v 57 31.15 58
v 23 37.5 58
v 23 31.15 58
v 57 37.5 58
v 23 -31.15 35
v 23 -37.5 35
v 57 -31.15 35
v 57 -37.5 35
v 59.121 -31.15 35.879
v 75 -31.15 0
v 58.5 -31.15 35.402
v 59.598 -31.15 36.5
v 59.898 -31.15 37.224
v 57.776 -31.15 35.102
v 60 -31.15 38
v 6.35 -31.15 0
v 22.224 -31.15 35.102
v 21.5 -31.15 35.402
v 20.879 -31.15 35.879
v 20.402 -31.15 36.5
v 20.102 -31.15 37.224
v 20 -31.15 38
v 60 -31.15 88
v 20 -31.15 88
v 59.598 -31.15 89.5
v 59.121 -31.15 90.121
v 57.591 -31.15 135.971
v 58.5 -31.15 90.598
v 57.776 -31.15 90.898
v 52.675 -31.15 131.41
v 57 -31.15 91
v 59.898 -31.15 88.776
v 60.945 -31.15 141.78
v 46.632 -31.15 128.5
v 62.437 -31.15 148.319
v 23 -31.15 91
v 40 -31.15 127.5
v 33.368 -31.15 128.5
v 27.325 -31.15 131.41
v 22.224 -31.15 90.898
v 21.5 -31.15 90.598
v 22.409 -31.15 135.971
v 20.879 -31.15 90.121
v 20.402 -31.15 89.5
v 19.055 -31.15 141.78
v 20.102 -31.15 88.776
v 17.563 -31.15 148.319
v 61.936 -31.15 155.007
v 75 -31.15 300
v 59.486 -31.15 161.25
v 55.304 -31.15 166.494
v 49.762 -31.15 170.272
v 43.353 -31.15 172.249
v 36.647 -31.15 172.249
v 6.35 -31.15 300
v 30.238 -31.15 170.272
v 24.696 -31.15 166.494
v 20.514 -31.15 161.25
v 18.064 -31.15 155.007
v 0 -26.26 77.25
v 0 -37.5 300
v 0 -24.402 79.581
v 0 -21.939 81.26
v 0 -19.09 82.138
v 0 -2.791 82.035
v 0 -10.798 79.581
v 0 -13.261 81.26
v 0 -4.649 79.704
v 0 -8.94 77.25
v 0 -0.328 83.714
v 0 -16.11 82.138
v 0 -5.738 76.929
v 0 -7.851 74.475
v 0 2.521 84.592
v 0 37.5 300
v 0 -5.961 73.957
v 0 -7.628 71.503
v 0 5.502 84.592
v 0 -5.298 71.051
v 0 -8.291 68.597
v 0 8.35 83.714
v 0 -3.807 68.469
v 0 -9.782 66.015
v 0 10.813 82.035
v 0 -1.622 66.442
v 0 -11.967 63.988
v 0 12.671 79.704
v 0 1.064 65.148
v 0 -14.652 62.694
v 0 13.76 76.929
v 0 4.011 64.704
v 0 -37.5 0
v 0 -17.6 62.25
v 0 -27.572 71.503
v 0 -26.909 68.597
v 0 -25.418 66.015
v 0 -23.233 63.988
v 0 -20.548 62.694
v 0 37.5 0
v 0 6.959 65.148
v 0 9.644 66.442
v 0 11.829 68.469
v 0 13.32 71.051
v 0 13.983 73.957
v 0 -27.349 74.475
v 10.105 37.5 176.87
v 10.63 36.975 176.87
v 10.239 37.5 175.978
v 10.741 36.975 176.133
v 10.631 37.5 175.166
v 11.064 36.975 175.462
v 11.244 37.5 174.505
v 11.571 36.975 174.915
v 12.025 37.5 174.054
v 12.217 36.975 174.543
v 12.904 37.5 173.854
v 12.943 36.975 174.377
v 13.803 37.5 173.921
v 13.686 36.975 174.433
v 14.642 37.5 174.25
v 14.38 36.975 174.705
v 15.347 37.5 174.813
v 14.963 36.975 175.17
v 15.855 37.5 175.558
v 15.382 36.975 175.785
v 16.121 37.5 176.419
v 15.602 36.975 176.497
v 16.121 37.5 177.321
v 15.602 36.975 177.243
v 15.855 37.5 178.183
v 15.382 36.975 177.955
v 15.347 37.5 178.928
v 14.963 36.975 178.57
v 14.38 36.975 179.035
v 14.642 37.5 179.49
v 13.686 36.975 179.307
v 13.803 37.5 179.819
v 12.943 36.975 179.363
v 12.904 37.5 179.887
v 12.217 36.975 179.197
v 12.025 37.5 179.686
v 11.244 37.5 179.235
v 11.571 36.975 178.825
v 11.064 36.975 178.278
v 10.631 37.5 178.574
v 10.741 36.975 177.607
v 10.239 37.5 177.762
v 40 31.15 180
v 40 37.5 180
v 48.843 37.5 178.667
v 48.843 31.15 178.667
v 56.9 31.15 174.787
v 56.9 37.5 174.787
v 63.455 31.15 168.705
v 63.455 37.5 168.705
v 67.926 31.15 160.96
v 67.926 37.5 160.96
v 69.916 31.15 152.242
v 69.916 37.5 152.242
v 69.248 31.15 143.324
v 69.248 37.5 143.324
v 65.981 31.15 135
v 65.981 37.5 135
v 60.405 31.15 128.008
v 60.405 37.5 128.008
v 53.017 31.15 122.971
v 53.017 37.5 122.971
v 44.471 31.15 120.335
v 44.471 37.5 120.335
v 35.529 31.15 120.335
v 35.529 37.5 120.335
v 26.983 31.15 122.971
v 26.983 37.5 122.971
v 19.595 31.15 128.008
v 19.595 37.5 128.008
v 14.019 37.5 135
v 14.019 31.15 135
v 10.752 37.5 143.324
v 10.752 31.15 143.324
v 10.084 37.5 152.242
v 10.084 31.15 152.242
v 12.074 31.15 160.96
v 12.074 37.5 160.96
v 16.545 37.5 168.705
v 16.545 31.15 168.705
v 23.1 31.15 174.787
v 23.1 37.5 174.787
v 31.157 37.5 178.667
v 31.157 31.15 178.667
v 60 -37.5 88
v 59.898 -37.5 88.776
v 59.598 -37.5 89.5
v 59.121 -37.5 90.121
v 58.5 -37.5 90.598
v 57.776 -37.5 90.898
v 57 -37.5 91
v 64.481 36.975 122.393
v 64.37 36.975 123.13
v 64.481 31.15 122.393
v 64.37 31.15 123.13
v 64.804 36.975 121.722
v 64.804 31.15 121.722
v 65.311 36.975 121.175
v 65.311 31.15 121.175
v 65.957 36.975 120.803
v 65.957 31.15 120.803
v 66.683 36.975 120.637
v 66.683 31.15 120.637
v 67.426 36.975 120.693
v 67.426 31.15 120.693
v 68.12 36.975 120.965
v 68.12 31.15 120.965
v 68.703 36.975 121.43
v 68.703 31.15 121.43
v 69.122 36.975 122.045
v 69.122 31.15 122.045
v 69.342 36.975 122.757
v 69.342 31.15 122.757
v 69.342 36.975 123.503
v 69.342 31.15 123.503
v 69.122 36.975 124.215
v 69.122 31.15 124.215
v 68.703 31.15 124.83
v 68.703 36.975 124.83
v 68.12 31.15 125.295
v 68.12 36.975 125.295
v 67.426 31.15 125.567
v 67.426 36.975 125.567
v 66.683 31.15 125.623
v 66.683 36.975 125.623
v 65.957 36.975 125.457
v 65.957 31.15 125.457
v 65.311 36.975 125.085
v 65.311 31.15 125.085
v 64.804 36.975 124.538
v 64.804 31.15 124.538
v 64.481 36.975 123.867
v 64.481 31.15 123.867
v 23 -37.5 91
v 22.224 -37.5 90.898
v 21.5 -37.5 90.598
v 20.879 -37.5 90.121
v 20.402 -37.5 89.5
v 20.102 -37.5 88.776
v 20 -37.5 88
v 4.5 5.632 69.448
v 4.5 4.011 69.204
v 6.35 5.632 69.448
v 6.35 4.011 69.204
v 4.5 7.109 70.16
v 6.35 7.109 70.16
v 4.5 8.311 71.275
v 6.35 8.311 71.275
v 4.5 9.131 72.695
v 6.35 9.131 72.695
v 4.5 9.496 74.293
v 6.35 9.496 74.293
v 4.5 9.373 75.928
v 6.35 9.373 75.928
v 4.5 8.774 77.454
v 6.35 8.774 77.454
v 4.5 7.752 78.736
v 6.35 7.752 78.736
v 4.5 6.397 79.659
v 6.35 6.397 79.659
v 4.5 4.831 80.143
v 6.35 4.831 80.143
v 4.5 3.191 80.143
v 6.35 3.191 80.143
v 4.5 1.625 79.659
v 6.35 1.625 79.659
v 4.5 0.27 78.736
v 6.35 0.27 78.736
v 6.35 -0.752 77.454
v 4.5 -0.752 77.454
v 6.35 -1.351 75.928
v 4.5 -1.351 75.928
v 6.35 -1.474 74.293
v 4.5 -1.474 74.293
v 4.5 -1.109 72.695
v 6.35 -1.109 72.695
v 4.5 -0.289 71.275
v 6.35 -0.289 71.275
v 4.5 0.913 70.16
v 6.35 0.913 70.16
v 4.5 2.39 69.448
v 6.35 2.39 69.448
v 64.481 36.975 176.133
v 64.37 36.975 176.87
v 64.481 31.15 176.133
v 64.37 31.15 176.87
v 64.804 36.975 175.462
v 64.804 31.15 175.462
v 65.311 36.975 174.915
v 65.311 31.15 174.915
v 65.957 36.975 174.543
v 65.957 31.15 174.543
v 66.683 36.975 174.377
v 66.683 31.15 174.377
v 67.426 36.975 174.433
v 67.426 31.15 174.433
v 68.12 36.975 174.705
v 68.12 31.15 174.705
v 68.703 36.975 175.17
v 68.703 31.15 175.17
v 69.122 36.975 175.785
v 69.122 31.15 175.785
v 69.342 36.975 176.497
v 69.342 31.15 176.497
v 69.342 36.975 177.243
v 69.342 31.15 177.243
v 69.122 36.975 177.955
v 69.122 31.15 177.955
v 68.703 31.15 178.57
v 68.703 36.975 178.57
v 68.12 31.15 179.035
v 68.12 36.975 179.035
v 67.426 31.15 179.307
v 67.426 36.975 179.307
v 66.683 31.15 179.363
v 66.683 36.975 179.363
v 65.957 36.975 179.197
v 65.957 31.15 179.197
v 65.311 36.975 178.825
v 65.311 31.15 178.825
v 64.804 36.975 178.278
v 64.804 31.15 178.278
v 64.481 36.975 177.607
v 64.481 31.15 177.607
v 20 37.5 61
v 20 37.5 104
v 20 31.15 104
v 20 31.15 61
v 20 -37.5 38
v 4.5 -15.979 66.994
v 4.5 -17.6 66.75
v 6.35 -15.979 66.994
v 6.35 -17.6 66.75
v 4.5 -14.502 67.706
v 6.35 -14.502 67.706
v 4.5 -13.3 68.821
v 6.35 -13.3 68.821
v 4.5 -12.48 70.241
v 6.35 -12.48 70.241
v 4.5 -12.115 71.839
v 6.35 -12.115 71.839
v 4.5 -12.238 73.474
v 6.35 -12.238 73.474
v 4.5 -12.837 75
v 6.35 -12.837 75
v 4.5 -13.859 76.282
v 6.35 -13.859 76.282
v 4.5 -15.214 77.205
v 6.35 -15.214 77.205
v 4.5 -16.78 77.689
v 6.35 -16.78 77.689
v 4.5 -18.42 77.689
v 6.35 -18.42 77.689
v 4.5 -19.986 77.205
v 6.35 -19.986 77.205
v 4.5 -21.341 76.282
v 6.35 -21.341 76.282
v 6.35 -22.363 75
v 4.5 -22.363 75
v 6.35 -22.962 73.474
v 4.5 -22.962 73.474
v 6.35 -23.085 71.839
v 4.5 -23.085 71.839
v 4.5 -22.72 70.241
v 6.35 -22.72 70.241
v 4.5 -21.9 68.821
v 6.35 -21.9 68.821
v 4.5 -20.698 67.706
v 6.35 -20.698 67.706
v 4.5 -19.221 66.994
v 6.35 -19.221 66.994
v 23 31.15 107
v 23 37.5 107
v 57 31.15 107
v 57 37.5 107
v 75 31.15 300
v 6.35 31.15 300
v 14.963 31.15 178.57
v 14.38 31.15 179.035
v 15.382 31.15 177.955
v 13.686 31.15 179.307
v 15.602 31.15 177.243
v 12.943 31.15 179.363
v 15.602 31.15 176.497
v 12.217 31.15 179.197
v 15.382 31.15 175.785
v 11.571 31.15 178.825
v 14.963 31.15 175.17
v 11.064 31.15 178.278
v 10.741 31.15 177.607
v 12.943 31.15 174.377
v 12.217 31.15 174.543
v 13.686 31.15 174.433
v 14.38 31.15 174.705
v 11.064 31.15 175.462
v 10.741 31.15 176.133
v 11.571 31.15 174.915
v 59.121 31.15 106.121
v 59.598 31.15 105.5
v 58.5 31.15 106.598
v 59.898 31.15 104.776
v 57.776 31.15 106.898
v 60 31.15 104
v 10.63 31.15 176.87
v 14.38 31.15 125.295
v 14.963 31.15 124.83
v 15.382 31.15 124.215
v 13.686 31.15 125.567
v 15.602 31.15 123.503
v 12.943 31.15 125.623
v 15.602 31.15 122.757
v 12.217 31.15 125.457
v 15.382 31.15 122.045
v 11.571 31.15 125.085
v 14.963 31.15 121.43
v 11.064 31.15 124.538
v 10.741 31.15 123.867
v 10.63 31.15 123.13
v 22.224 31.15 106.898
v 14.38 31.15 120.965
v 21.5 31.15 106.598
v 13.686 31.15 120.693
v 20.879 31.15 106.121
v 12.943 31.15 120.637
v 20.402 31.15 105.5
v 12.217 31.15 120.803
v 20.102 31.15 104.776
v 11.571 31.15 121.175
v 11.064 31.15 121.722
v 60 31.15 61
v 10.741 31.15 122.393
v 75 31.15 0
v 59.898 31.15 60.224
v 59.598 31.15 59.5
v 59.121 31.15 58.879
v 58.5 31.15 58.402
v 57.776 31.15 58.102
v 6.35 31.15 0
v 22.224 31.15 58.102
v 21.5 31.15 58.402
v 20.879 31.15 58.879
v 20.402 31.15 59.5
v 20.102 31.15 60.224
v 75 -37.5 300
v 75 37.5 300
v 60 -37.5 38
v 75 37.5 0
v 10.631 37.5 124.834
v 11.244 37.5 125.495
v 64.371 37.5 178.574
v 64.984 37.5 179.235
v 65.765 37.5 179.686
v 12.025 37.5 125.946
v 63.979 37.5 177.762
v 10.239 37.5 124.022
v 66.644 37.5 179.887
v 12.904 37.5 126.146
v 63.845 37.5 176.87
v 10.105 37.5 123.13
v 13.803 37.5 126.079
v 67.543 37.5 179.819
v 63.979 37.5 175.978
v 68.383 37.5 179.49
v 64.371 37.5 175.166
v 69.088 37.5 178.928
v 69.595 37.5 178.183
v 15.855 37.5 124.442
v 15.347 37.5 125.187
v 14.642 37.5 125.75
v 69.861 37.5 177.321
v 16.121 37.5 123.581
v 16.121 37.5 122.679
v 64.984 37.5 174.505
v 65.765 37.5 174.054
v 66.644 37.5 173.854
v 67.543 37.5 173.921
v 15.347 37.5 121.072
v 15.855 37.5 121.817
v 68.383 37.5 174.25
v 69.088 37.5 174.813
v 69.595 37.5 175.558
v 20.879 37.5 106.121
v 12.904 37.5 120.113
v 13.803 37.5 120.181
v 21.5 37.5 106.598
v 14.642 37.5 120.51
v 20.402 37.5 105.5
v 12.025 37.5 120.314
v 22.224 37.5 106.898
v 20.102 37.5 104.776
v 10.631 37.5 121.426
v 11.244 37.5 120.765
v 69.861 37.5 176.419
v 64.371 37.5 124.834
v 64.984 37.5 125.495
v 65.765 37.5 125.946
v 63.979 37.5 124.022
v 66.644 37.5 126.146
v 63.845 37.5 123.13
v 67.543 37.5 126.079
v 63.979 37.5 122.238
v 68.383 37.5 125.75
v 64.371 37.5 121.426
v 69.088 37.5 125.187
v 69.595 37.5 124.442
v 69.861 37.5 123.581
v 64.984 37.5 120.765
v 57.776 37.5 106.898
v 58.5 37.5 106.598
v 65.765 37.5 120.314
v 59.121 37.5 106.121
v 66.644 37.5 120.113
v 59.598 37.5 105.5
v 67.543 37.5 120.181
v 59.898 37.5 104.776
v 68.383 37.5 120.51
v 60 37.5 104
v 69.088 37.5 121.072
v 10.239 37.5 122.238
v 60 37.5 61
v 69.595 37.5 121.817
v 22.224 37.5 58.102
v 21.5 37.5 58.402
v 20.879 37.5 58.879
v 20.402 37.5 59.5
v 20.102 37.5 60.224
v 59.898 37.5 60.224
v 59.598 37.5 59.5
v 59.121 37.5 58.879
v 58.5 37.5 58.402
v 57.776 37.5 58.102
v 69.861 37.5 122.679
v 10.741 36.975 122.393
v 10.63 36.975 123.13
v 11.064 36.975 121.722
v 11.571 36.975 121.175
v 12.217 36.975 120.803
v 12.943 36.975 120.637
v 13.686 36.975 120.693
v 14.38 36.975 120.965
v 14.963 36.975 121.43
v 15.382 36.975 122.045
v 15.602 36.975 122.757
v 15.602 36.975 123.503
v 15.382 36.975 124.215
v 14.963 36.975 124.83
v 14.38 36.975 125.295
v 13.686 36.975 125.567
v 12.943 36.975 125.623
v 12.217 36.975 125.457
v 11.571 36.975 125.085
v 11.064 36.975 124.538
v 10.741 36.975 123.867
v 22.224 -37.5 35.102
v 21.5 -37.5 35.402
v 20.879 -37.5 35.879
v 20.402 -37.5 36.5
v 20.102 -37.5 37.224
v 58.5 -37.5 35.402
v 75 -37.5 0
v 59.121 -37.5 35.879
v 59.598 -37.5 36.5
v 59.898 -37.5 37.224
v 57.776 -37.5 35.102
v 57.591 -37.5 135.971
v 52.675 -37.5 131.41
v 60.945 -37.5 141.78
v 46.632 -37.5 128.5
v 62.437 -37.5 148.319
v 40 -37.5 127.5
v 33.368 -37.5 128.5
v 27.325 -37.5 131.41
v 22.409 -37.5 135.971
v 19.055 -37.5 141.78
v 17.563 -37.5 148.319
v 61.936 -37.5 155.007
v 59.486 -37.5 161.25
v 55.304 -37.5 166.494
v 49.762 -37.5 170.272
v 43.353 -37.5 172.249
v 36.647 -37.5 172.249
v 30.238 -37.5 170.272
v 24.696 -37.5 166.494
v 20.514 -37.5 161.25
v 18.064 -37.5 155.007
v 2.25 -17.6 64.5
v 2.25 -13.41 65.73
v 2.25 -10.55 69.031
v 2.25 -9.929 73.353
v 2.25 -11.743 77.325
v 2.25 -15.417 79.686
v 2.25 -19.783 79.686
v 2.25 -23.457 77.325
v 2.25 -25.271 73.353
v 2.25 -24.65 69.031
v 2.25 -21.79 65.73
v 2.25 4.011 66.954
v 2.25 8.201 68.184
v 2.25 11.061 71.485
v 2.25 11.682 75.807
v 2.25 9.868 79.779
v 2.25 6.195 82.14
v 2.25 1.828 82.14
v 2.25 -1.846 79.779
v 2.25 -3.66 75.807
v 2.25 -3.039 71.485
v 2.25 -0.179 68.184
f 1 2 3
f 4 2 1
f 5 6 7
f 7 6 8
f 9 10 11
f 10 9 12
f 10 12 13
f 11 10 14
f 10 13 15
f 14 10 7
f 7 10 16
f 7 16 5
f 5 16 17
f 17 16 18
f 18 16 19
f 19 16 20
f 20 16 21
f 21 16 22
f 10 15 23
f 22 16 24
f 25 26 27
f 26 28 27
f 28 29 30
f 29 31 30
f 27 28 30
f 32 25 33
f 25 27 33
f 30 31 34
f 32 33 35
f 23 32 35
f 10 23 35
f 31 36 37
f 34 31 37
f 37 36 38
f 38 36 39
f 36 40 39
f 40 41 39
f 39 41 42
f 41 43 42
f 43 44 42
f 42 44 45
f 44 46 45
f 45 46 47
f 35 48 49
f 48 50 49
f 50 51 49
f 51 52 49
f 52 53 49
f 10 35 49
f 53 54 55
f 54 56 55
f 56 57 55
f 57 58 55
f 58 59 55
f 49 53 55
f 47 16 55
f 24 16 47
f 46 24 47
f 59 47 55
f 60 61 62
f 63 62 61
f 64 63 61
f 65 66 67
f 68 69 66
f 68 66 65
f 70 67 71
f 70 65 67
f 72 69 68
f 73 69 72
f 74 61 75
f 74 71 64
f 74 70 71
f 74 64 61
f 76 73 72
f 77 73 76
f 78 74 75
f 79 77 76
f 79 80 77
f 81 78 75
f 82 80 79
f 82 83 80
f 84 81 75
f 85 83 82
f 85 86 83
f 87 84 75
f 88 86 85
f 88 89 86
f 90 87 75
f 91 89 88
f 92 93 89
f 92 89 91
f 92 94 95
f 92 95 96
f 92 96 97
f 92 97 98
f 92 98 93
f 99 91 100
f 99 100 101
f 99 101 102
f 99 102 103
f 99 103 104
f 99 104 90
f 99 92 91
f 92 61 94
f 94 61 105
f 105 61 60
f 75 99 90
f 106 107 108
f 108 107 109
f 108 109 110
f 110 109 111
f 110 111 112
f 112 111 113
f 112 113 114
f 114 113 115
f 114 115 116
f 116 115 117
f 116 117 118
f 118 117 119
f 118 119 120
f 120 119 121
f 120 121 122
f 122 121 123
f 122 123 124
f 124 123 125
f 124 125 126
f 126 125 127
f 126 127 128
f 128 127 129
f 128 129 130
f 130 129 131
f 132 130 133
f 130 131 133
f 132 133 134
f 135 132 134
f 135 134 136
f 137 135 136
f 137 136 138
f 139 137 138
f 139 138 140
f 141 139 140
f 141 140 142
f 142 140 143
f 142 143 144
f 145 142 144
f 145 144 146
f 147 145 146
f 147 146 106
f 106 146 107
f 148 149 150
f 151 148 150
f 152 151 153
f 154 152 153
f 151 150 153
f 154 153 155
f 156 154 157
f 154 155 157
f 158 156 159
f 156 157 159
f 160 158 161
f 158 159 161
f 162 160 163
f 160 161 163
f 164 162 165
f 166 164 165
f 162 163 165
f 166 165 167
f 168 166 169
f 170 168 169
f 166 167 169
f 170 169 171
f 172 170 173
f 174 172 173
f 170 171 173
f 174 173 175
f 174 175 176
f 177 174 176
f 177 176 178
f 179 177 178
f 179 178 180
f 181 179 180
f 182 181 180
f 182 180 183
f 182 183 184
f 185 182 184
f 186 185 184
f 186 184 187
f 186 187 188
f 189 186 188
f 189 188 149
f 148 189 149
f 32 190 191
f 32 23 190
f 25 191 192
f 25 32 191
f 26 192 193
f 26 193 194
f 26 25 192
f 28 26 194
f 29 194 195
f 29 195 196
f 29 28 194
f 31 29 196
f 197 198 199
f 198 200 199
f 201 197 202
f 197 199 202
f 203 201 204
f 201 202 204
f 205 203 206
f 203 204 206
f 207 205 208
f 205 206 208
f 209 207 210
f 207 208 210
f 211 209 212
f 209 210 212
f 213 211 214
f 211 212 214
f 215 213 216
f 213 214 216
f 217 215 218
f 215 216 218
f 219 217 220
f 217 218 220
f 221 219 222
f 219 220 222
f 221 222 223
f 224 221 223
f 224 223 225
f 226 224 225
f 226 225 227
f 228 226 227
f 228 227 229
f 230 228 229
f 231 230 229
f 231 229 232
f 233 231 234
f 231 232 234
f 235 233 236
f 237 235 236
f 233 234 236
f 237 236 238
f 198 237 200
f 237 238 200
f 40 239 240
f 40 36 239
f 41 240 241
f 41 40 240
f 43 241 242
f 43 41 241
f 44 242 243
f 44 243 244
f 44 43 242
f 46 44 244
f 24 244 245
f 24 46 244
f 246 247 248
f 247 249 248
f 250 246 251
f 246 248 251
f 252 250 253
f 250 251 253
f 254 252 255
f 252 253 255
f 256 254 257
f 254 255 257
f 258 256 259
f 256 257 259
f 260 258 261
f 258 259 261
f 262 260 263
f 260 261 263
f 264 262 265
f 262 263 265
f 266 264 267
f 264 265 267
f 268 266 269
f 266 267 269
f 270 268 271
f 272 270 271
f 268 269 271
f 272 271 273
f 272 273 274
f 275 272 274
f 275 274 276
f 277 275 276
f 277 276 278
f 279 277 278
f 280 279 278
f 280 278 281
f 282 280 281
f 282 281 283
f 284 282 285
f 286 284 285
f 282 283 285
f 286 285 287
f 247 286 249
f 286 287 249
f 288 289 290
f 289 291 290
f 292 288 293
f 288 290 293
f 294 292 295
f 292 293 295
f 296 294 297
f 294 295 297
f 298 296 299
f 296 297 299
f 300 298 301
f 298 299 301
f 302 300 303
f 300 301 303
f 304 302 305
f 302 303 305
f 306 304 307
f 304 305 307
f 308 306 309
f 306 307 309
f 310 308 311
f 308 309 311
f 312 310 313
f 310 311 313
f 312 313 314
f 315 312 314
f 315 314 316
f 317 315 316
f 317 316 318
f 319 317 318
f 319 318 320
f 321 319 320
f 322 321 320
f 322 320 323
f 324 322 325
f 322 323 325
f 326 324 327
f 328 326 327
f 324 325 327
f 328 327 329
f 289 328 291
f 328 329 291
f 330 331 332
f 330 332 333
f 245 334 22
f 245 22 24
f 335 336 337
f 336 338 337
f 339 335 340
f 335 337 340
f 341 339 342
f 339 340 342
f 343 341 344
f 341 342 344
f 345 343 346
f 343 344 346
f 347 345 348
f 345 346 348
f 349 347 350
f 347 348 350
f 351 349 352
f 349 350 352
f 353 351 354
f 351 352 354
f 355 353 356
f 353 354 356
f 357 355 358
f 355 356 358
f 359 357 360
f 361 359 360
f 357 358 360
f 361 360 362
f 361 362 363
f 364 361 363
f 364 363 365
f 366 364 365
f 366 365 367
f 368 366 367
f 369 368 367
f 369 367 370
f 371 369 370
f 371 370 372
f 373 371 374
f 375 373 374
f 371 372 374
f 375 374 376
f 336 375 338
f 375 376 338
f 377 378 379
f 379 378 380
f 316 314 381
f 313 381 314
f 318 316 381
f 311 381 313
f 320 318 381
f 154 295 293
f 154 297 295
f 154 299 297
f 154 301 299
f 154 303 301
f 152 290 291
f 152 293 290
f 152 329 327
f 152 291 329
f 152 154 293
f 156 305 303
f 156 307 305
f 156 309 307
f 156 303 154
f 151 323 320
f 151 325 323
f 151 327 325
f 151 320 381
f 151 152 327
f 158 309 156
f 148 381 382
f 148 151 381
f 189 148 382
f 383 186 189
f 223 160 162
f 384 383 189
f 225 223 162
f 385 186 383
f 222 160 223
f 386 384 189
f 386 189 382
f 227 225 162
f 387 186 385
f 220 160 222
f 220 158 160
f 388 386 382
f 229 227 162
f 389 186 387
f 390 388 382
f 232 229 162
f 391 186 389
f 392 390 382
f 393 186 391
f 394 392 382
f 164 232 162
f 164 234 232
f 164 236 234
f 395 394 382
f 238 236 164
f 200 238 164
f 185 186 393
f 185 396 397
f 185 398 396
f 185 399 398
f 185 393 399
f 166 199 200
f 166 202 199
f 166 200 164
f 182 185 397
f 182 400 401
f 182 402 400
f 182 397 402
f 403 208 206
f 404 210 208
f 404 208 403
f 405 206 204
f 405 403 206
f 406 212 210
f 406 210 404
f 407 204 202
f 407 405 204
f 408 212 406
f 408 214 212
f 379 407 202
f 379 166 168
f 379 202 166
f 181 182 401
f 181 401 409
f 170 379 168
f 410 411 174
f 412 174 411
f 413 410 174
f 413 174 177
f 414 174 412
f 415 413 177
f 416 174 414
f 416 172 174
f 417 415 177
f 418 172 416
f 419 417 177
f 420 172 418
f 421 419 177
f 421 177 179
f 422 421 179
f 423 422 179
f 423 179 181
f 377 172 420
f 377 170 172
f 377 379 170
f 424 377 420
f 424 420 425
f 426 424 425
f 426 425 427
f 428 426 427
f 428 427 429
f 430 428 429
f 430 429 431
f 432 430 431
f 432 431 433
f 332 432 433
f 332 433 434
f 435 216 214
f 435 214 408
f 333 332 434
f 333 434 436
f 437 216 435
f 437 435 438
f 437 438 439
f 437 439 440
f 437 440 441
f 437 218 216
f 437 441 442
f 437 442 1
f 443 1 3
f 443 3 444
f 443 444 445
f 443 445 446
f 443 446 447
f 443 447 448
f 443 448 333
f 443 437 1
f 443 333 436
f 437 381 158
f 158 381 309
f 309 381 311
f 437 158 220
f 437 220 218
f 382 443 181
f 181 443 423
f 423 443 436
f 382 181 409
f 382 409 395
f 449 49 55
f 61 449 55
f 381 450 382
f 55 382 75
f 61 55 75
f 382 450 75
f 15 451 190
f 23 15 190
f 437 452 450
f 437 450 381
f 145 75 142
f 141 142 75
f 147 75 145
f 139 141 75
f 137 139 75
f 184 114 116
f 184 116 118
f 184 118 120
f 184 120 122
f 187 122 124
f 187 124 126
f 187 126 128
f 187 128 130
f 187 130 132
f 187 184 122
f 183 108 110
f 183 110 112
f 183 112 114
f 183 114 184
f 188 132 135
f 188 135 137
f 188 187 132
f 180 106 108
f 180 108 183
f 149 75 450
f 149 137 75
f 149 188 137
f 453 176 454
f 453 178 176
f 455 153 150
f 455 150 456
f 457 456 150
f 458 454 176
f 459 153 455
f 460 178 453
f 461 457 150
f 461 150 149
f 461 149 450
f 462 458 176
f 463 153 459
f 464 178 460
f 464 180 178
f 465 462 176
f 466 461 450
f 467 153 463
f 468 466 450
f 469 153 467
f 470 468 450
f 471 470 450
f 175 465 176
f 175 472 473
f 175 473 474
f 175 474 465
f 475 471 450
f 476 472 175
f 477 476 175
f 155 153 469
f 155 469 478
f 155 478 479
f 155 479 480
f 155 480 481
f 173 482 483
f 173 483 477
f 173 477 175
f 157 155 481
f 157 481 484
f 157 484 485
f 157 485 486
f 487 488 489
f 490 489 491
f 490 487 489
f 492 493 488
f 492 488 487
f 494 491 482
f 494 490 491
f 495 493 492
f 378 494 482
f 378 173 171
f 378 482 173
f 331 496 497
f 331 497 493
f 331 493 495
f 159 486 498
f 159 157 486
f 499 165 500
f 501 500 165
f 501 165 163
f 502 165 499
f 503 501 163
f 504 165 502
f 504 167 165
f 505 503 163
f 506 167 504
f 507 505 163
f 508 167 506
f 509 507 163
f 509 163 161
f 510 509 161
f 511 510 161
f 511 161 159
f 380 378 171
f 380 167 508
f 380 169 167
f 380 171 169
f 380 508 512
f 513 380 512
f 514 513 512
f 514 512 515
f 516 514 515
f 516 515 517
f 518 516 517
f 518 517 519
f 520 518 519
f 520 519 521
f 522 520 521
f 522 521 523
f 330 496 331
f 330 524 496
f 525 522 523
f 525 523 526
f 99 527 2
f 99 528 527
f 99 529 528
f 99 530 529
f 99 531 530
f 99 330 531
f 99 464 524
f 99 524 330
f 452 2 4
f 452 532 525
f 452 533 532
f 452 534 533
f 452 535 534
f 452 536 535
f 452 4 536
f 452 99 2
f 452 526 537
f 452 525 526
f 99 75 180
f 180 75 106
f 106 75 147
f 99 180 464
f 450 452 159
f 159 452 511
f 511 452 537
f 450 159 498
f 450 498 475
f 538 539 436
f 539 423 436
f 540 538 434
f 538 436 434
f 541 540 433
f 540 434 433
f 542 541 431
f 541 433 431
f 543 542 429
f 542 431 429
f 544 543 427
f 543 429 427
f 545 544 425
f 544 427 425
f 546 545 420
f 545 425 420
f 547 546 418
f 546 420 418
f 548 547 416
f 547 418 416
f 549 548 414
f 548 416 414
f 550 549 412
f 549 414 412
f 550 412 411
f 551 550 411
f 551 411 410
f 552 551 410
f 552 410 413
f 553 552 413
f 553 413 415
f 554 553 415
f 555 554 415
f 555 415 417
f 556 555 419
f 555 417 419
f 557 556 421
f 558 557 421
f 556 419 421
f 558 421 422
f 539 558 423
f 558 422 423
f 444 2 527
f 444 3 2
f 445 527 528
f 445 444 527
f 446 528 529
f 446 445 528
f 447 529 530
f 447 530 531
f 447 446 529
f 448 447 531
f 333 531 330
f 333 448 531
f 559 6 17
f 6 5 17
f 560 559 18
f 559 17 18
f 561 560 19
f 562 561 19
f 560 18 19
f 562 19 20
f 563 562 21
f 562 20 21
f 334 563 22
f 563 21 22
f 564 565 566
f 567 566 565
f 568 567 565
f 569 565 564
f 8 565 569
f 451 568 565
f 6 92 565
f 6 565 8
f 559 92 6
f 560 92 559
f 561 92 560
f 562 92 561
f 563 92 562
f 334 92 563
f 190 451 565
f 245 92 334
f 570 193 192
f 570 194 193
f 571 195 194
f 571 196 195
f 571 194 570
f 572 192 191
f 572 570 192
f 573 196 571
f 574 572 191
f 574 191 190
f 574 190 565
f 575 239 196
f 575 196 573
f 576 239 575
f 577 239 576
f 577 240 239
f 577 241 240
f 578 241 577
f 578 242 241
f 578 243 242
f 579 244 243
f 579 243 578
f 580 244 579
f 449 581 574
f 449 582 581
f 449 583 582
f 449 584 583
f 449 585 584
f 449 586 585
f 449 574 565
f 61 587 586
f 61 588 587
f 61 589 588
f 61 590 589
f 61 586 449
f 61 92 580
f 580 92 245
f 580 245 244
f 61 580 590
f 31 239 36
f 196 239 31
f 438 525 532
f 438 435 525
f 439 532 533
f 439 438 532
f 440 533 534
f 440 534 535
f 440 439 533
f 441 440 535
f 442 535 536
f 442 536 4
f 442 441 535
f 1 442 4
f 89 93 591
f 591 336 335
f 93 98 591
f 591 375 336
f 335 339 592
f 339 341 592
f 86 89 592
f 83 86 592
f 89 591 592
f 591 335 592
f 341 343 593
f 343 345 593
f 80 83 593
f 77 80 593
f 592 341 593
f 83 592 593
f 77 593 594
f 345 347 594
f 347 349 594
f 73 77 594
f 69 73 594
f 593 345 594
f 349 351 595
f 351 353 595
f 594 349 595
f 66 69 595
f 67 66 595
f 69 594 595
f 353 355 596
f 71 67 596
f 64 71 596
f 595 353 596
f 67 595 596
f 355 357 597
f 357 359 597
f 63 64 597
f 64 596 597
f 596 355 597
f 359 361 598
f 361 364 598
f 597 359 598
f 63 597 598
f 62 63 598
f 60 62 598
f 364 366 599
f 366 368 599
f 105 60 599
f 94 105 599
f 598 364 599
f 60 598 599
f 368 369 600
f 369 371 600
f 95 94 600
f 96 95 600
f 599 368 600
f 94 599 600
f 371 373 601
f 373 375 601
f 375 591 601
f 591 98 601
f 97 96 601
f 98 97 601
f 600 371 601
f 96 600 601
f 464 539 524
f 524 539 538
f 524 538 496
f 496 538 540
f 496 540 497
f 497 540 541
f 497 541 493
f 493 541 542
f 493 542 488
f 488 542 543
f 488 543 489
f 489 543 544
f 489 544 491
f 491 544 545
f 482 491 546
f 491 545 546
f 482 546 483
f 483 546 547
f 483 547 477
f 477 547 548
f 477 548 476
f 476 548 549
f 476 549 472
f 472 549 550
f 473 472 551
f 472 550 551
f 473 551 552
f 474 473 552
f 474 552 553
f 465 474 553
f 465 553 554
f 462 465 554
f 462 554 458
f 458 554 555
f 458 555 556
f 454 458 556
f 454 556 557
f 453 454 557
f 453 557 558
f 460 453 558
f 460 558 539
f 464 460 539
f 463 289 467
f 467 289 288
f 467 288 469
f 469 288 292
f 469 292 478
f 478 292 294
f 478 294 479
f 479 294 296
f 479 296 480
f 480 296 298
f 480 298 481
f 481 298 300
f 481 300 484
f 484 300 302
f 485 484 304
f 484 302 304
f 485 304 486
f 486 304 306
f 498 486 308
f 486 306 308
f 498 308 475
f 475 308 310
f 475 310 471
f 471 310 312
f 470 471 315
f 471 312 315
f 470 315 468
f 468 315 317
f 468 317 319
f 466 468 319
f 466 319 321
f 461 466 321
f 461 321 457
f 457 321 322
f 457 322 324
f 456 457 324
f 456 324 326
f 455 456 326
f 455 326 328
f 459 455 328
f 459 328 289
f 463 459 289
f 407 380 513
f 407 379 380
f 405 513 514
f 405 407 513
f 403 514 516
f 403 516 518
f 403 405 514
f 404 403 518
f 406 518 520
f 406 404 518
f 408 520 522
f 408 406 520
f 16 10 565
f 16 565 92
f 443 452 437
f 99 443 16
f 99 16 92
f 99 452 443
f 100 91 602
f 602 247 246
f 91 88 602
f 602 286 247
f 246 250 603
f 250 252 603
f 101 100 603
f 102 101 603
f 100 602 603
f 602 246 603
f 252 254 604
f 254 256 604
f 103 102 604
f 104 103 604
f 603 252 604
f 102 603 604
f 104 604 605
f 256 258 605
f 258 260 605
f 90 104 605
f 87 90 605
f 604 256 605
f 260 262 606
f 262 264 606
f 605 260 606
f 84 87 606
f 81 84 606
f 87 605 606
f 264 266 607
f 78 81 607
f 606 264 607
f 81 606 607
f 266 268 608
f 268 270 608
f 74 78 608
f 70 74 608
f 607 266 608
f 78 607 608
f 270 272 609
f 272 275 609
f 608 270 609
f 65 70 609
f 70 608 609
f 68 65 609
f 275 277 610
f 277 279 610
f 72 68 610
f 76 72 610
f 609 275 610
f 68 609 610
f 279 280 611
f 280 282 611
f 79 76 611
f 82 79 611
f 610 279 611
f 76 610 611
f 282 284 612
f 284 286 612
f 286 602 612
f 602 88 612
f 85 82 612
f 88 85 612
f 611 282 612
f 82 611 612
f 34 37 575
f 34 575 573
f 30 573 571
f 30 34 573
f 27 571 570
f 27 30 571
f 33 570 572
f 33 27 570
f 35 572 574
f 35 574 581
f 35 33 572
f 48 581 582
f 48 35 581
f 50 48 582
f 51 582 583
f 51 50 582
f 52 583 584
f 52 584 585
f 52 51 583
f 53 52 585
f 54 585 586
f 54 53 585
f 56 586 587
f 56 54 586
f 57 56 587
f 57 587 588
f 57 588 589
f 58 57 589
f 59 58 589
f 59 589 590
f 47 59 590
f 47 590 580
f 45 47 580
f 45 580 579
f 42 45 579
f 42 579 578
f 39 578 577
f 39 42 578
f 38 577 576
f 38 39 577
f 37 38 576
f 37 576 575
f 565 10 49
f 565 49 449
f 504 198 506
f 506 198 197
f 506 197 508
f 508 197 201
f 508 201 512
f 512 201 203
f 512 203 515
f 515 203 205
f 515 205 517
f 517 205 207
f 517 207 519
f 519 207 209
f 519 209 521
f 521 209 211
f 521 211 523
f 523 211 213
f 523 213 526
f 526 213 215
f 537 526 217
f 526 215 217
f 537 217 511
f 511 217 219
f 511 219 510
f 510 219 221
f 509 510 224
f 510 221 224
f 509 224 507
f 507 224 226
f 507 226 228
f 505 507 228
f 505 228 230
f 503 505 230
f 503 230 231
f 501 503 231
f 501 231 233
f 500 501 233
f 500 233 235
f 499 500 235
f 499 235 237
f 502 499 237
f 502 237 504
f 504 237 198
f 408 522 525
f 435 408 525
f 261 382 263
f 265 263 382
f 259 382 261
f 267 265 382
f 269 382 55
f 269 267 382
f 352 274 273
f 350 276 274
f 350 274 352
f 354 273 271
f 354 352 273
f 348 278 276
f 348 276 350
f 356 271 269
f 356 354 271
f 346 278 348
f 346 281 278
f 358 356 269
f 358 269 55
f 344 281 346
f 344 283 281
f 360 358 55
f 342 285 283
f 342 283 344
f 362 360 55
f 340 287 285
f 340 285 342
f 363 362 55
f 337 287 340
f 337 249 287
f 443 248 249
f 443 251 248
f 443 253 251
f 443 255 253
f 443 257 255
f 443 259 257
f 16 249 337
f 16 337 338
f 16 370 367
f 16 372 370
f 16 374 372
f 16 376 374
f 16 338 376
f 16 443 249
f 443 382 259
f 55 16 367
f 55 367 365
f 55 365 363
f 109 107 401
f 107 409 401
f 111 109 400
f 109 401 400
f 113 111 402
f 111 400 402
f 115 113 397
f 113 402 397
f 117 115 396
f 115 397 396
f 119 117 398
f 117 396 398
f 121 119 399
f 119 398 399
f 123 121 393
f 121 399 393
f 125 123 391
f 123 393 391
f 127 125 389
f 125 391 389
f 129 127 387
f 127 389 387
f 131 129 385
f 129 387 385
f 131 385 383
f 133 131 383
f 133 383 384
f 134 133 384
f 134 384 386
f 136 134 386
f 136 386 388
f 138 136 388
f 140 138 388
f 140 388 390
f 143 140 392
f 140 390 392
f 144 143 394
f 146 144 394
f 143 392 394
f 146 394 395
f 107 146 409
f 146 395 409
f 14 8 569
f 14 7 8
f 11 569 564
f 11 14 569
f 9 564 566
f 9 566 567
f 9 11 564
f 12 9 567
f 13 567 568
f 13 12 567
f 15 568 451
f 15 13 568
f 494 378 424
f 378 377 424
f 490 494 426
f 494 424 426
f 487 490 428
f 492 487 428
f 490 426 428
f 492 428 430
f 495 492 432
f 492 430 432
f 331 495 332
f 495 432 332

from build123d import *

# Parameters (mm, degrees)
BOSS_EXTRUDE1_DEPTH                                  = 300
SKETCH2_R                                            = 30
CUT_EXTRUDE1_DEPTH                                   = 319.198051534
SKETCH3_W                                            = 40
SKETCH3_H                                            = 56
CUT_EXTRUDE2_DEPTH                                   = 10
SKETCH4_W                                            = 40
SKETCH4_H                                            = 49
CUT_EXTRUDE3_DEPTH                                   = 10
FILLET1_R                                            = 3
CSK_FOR_M10_COUNTERSUNK_FLAT_HEAD_SCREW1_D           = 11
CSK_FOR_M10_COUNTERSUNK_FLAT_HEAD_SCREW1_DEPTH       = 20.003
CSK_FOR_M10_COUNTERSUNK_FLAT_HEAD_SCREW1_CSINK_D     = 20
CSK_FOR_M10_COUNTERSUNK_FLAT_HEAD_SCREW1_CSINK_ANGLE = 90
CSK_FOR_M10_COUNTERSUNK_FLAT_HEAD_SCREW1_TIP         = 3.304733405
BOSS_EXTRUDE2_START                                  = -6.35
SKETCH7_R                                            = 30
SKETCH7_R_2                                          = 22.5
BOSS_EXTRUDE2_DEPTH                                  = 6.35
M6X1_0_TAPPED_HOLE1_D                                = 5
M6X1_0_TAPPED_HOLE1_DEPTH                            = 15
M6X1_0_TAPPED_HOLE1_CSINK_D                          = 6.05
M6X1_0_TAPPED_HOLE1_CSINK_ANGLE                      = 90
M6X1_0_TAPPED_HOLE1_TIP                              = 1.502151548


with BuildPart() as part:
    # Sketch1 → Boss-Extrude1 (new body)
    with BuildSketch(Plane.XY):
        Polygon((0, -37.5), (0, 37.5), (75, 37.5), (75, 31.15), (6.35, 31.15), (6.35, -31.15), (75, -31.15), (75, -37.5), align=None)
    extrude(amount=BOSS_EXTRUDE1_DEPTH)

    # Sketch2 → Cut-Extrude1 (cut, through all)
    with BuildSketch(Plane(origin=(0, 37.5, 0), x_dir=(1, 0, 0), z_dir=(0, 1, 0))):
        with Locations(Location((40, -150, 0), (0, 0, 270))):
            Circle(SKETCH2_R)
    extrude(amount=-CUT_EXTRUDE1_DEPTH, mode=Mode.SUBTRACT)

    # Sketch3 → Cut-Extrude2 (cut)
    with BuildSketch(Plane.XZ.offset(37.5)):
        with Locations((40, 63)):
            Rectangle(SKETCH3_W, SKETCH3_H)
    extrude(amount=-CUT_EXTRUDE2_DEPTH, mode=Mode.SUBTRACT)

    # Sketch4 → Cut-Extrude3 (cut)
    with BuildSketch(Plane(origin=(0, 37.5, 0), x_dir=(1, 0, 0), z_dir=(0, 1, 0))):
        with Locations((40, -82.5)):
            Rectangle(SKETCH4_W, SKETCH4_H)
    extrude(amount=-CUT_EXTRUDE3_DEPTH, mode=Mode.SUBTRACT)

    # Fillet1
    fillet1_edges = [part.edges().sort_by_distance(p)[0] for p in [
        (20, -34.325, 91),
        (60, -34.325, 91),
        (60, -34.325, 35),
        (20, -34.325, 35),
        (60, 34.325, 107),
        (20, 34.325, 107),
        (20, 34.325, 58),
        (60, 34.325, 58),
    ]]
    fillet(fillet1_edges, radius=FILLET1_R)

    # CSK for M10 Countersunk Flat Head Screw1
    with Locations(Plane.ZY):
        with Locations((74.704121605, 4.01110333), (72.25, -17.6)):
            CounterSinkHole(CSK_FOR_M10_COUNTERSUNK_FLAT_HEAD_SCREW1_D / 2, CSK_FOR_M10_COUNTERSUNK_FLAT_HEAD_SCREW1_CSINK_D / 2, depth=CSK_FOR_M10_COUNTERSUNK_FLAT_HEAD_SCREW1_DEPTH, counter_sink_angle=CSK_FOR_M10_COUNTERSUNK_FLAT_HEAD_SCREW1_CSINK_ANGLE)
            with Locations((0, 0, -(CSK_FOR_M10_COUNTERSUNK_FLAT_HEAD_SCREW1_DEPTH + CSK_FOR_M10_COUNTERSUNK_FLAT_HEAD_SCREW1_TIP / 2))):  # 118° drill point
                Cone(0, CSK_FOR_M10_COUNTERSUNK_FLAT_HEAD_SCREW1_D / 2, CSK_FOR_M10_COUNTERSUNK_FLAT_HEAD_SCREW1_TIP, mode=Mode.SUBTRACT)

    # Sketch7 → Boss-Extrude2 (add)
    with BuildSketch(Plane.XZ.offset(37.5).offset(BOSS_EXTRUDE2_START)):
        with Locations(Location((40, 150, 0), (0, 0, 90))):
            Circle(SKETCH7_R)
        with Locations(Location((40, 150, 0), (0, 0, 270))):
            Circle(SKETCH7_R_2, mode=Mode.SUBTRACT)
    extrude(amount=BOSS_EXTRUDE2_DEPTH)

    # M6x1.0 Tapped Hole1
    with Locations(Plane(origin=(0, 37.5, 0), x_dir=(1, 0, 0), z_dir=(0, 1, 0))):
        with Locations((66.870057685, -123.129942315), (13.129942315, -123.129942315), (13.129942315, -176.870057685), (66.870057685, -176.870057685)):
            CounterSinkHole(M6X1_0_TAPPED_HOLE1_D / 2, M6X1_0_TAPPED_HOLE1_CSINK_D / 2, depth=M6X1_0_TAPPED_HOLE1_DEPTH, counter_sink_angle=M6X1_0_TAPPED_HOLE1_CSINK_ANGLE)
            with Locations((0, 0, -(M6X1_0_TAPPED_HOLE1_DEPTH + M6X1_0_TAPPED_HOLE1_TIP / 2))):  # 118° drill point
                Cone(0, M6X1_0_TAPPED_HOLE1_D / 2, M6X1_0_TAPPED_HOLE1_TIP, mode=Mode.SUBTRACT)


solid = part.part
